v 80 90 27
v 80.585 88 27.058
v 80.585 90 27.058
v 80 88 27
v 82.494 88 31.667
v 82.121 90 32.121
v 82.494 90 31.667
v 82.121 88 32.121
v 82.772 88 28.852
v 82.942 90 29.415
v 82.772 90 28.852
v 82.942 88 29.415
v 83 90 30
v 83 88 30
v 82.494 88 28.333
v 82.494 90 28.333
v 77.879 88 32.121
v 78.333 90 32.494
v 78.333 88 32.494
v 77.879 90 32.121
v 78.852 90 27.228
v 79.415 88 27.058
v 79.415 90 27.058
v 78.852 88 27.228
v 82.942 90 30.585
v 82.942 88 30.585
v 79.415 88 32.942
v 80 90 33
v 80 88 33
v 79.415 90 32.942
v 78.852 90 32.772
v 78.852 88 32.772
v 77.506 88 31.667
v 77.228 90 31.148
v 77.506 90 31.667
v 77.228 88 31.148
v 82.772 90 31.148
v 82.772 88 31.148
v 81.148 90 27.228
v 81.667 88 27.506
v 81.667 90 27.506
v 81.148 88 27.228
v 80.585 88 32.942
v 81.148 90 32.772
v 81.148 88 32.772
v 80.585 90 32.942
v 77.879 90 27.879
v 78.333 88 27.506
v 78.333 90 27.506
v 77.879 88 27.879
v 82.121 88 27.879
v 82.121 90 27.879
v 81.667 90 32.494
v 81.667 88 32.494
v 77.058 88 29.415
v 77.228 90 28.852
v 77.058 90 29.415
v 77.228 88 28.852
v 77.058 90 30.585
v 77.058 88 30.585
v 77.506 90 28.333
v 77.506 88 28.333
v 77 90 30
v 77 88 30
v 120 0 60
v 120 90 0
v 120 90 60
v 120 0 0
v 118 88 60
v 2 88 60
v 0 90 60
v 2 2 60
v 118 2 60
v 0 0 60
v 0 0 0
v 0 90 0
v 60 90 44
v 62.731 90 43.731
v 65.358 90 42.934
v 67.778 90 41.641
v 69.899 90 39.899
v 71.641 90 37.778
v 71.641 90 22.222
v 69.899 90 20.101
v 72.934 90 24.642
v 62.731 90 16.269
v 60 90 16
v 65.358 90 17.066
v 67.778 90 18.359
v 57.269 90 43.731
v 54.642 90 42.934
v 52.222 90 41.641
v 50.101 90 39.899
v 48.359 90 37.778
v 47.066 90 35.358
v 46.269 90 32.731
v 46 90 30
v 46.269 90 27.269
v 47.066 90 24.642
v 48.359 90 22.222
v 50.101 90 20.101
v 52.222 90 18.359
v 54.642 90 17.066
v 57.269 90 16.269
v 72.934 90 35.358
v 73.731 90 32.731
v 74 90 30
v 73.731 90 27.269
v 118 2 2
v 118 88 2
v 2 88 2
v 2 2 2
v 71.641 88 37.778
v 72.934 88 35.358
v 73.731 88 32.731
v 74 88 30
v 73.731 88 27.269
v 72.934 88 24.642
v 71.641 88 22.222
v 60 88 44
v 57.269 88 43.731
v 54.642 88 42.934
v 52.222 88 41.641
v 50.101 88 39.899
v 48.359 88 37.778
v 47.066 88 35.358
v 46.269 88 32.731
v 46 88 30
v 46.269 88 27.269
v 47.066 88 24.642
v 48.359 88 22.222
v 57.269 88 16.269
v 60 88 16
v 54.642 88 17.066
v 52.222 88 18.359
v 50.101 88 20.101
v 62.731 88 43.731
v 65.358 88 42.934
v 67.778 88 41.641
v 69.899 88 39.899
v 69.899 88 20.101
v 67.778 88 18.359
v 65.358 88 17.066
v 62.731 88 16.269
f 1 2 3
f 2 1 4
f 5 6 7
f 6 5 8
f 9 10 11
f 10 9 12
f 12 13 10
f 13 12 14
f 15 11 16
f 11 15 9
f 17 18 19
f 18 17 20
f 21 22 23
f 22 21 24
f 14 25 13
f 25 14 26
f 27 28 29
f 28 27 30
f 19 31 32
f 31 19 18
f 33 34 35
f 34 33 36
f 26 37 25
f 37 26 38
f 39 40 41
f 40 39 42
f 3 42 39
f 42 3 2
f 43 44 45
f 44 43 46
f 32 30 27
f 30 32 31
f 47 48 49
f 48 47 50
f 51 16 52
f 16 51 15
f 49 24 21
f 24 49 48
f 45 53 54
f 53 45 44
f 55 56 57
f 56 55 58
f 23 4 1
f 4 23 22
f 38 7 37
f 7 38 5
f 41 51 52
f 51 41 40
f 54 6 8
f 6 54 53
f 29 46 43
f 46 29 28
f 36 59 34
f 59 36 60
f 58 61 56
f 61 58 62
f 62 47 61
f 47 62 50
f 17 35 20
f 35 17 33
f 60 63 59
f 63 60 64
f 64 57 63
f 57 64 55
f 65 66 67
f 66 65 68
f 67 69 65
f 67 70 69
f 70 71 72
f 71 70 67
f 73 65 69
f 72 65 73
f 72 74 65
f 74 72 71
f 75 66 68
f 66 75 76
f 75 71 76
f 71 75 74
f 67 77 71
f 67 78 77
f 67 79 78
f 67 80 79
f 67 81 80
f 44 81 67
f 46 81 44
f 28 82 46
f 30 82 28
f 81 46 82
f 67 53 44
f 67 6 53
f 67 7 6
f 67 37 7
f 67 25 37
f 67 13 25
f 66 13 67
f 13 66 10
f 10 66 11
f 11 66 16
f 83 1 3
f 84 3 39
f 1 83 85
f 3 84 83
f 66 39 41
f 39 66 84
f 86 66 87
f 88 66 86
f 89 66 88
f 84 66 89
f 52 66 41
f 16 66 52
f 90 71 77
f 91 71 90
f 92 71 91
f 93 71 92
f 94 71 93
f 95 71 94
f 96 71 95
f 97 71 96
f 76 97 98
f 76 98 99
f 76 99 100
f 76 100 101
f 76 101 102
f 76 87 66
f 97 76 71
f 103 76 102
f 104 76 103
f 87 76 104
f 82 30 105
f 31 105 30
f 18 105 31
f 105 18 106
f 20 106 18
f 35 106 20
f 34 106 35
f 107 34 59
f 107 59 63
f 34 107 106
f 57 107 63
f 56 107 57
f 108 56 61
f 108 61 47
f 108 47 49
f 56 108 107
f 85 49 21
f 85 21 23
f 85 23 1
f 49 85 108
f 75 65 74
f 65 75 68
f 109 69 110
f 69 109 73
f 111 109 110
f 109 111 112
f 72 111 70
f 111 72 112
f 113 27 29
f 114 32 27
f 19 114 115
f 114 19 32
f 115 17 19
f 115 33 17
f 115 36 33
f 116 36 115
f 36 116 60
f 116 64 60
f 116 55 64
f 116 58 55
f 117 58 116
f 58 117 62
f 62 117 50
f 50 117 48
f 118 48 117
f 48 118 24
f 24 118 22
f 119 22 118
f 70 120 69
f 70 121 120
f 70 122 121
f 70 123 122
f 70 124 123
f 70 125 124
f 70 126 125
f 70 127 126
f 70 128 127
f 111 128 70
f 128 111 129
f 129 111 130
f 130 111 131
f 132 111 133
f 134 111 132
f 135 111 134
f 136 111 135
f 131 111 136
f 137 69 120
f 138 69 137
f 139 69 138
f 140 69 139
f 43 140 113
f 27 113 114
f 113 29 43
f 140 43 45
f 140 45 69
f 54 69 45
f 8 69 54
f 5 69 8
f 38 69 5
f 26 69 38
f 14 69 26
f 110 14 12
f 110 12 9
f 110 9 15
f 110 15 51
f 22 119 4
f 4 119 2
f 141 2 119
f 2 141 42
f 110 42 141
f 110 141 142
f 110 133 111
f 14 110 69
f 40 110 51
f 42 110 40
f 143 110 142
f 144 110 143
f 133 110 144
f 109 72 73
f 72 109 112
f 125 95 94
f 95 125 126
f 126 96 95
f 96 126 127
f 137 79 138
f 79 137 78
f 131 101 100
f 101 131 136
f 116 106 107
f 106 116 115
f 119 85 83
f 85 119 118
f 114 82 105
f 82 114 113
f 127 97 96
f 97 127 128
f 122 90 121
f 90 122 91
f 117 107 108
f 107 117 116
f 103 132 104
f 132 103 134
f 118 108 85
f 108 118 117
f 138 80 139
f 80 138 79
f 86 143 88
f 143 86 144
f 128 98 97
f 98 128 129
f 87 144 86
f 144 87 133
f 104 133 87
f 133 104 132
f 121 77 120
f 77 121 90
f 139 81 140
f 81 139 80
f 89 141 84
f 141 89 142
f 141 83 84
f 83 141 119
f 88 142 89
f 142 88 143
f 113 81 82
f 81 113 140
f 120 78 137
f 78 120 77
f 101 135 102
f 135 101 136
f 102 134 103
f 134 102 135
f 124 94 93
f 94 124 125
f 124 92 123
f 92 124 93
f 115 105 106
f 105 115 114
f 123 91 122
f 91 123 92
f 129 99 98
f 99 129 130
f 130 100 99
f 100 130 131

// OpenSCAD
$fn = 32;

// ----------------------------------------------------------------------
// Vent box: roundvent enclosure
// ----------------------------------------------------------------------

// --- parameters (mm) ---
box_l = 120;              // box length, X
box_w = 90;               // box width, Y
box_h = 60;               // box height, Z
wall_t = 2;               // shell wall thickness
vent_d = 28;              // central vent diameter
ring_d = 6;               // ring hole diameter
n_ring = 8;               // holes in the ring
ring_r = 20;              // ring radius

ring_step = 360 / n_ring;  // ring hole angular step

difference() {
  cube([box_l, box_w, box_h]);
  translate([wall_t, wall_t, wall_t])
    cube([box_l - 2 * wall_t, box_w - 2 * wall_t, box_h]);
  translate([box_l / 2, box_w - wall_t - 1, box_h / 2])
    rotate([-90, 0, 0]) cylinder(h = wall_t + 2, d = vent_d);
  for (i = [0 : n_ring - 1])
    translate([box_l / 2, box_w - wall_t - 1, box_h / 2])
      rotate([0, 0, i * ring_step])
        translate([ring_r, 0, 0]) rotate([-90, 0, 0])
          cylinder(h = wall_t + 2, d = ring_d);
}
